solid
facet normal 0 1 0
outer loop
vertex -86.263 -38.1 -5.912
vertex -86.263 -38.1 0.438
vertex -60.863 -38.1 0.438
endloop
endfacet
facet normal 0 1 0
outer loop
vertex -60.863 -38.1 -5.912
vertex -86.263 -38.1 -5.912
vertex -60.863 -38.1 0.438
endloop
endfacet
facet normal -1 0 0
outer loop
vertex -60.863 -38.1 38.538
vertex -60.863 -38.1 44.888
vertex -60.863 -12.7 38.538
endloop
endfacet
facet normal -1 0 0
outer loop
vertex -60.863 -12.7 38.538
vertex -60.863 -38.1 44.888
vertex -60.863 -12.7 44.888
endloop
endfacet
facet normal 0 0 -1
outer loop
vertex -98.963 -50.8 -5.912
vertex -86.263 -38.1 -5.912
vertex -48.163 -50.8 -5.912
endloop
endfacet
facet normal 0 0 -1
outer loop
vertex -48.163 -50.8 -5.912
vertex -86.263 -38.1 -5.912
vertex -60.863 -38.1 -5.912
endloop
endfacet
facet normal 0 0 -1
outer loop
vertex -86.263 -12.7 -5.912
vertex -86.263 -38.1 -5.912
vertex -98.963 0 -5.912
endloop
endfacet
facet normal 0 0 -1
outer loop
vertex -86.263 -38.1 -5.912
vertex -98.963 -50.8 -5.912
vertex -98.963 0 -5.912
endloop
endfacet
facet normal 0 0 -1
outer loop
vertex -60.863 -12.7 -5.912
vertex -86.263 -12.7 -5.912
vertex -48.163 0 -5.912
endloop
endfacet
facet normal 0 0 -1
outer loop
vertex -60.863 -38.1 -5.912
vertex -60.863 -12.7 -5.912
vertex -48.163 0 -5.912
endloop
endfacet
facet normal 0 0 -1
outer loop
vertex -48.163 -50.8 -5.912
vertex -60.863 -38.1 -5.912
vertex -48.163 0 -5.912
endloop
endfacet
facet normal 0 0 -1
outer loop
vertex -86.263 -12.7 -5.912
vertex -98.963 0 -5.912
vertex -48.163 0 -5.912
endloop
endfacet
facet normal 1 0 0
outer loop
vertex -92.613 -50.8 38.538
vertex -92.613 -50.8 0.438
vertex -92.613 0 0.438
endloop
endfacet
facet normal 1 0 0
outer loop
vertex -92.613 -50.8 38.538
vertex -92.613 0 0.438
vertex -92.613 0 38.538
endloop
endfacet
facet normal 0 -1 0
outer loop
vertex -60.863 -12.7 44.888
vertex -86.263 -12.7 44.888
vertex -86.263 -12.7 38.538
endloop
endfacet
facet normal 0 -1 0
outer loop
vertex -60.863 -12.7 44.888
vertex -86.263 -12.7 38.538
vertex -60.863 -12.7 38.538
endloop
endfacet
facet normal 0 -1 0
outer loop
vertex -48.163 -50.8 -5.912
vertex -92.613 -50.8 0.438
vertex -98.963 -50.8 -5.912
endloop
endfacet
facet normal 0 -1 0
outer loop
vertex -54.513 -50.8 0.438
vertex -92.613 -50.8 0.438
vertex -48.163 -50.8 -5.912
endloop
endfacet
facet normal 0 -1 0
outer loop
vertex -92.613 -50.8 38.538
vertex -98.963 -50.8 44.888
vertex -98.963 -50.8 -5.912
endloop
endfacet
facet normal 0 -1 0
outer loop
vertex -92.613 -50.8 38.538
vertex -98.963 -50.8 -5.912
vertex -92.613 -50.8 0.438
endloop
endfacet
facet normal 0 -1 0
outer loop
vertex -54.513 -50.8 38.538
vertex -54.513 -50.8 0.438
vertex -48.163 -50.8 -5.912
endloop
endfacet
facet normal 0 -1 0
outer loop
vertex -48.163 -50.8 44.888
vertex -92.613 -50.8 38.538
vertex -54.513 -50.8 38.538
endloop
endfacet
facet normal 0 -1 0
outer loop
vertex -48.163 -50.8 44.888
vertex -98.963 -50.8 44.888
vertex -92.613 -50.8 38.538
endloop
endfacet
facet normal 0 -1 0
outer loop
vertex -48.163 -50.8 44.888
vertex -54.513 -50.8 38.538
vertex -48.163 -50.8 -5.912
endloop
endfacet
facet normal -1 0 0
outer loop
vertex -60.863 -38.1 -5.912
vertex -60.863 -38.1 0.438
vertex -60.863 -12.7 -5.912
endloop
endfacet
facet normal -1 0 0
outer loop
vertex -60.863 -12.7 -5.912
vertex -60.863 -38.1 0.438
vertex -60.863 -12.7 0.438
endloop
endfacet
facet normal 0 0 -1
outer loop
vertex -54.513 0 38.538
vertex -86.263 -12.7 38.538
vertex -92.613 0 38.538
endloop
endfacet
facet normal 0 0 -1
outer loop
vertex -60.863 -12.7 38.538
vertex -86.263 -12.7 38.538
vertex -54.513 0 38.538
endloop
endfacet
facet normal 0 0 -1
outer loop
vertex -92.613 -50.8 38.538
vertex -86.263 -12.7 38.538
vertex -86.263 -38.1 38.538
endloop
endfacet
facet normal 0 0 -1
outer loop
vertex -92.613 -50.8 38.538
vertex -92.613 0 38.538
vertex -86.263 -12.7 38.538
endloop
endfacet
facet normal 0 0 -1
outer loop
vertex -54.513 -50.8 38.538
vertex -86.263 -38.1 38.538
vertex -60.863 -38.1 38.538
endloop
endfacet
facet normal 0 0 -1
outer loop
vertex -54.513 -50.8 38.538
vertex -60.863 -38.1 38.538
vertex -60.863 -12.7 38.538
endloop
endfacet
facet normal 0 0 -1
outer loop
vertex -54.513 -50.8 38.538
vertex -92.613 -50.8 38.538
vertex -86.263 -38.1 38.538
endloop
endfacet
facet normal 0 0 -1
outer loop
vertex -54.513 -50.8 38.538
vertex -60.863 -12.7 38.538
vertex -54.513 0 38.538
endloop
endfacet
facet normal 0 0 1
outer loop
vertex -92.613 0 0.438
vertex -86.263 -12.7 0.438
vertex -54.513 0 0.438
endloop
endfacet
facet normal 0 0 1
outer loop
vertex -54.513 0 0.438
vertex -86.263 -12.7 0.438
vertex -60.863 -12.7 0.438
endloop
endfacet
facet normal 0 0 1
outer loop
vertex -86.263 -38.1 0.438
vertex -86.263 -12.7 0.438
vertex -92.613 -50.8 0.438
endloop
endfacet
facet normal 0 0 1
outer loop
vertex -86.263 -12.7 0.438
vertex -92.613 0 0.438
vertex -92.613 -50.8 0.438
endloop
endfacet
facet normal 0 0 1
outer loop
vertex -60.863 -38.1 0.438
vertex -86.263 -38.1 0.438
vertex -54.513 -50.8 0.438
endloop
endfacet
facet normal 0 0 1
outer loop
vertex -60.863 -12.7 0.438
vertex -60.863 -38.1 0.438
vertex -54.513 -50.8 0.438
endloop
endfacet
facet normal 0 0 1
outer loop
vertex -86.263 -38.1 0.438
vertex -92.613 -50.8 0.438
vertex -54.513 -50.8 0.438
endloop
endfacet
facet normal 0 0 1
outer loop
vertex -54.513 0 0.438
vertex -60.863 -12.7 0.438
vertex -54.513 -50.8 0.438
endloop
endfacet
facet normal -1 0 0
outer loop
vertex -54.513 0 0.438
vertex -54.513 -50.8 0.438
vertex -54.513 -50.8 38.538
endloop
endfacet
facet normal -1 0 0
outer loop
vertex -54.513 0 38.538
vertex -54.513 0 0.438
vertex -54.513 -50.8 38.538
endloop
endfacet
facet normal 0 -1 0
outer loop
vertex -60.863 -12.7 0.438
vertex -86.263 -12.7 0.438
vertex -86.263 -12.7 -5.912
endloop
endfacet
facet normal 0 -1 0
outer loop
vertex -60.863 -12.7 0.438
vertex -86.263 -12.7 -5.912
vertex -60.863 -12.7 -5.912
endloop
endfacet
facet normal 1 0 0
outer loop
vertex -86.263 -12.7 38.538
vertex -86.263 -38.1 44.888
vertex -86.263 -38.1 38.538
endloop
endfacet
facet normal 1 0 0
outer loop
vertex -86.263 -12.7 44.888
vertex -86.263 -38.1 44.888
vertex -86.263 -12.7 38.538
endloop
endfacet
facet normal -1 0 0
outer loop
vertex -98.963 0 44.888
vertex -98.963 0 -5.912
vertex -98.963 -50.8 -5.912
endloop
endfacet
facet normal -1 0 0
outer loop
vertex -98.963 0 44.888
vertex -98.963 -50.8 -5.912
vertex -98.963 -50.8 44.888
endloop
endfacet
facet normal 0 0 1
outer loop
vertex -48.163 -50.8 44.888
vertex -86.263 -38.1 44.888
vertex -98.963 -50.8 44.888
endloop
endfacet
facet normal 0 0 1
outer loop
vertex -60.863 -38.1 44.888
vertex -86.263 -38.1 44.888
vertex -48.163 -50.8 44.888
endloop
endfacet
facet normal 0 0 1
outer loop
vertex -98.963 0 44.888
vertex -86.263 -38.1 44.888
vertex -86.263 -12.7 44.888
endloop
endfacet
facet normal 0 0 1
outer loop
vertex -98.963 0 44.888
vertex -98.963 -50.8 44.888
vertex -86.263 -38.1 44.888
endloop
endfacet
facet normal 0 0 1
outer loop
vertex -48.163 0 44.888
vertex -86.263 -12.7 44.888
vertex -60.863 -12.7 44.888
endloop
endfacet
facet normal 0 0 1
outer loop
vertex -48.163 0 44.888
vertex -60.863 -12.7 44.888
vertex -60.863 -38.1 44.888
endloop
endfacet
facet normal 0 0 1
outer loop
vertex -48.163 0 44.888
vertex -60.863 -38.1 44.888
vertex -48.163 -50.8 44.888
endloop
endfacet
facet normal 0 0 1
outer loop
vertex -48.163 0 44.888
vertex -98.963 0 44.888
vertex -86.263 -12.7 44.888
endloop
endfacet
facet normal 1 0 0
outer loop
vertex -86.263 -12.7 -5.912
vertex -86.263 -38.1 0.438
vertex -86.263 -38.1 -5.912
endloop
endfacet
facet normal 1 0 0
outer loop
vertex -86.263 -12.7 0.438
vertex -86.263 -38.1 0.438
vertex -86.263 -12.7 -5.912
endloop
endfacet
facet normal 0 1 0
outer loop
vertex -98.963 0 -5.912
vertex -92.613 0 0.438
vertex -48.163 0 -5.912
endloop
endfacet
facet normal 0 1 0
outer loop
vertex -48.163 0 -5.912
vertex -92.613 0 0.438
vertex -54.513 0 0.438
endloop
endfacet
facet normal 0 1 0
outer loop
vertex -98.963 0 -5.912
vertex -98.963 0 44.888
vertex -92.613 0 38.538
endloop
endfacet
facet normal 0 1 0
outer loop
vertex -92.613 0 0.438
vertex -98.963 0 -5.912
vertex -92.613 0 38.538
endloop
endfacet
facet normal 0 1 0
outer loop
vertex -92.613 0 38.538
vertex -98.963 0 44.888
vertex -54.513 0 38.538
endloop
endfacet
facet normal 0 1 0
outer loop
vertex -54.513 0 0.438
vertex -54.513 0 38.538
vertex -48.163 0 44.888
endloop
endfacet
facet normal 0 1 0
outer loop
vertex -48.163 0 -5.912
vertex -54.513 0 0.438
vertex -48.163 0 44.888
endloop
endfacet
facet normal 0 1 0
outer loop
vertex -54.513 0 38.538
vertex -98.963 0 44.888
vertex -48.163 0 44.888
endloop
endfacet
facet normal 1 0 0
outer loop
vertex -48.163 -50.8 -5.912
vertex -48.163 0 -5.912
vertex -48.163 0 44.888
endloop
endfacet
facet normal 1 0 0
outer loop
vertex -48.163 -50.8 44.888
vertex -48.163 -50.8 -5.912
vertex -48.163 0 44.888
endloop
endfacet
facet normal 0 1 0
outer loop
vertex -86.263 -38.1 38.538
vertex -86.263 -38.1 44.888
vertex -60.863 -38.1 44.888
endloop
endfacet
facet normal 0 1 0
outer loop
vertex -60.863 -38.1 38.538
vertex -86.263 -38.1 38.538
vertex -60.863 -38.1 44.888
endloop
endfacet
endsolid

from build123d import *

# Parameters (mm, degrees)
F0_W     = 50.8
F0_H     = 50.8
F1_DEPTH = 50.8
F2_W     = 38.1
F2_H     = 38.1
F3_DEPTH = 50.801
F4_W     = 25.4
F4_H     = 25.4
F5_DEPTH = 50.801


with BuildPart() as f1:
    # F0 (on Front) → F1 (new body)
    with BuildSketch(Plane.XZ):
        with Locations((-73.563374, 19.488397)):
            Rectangle(F0_W, F0_H)
    extrude(amount=F1_DEPTH)

    # F2 (on face) → F3 (cut, through all)
    with BuildSketch(Plane.XZ.offset(50.8)):
        with Locations((-73.563374, 19.488397)):
            Rectangle(F2_W, F2_H)
    extrude(amount=-F3_DEPTH, mode=Mode.SUBTRACT)

    # F4 (on face) → F5 (cut, through all)
    with BuildSketch(Plane.XY.offset(44.888397)):
        with Locations((-73.563374, -25.4)):
            Rectangle(F4_W, F4_H)
    extrude(amount=-F5_DEPTH, mode=Mode.SUBTRACT)


solid = f1.part
